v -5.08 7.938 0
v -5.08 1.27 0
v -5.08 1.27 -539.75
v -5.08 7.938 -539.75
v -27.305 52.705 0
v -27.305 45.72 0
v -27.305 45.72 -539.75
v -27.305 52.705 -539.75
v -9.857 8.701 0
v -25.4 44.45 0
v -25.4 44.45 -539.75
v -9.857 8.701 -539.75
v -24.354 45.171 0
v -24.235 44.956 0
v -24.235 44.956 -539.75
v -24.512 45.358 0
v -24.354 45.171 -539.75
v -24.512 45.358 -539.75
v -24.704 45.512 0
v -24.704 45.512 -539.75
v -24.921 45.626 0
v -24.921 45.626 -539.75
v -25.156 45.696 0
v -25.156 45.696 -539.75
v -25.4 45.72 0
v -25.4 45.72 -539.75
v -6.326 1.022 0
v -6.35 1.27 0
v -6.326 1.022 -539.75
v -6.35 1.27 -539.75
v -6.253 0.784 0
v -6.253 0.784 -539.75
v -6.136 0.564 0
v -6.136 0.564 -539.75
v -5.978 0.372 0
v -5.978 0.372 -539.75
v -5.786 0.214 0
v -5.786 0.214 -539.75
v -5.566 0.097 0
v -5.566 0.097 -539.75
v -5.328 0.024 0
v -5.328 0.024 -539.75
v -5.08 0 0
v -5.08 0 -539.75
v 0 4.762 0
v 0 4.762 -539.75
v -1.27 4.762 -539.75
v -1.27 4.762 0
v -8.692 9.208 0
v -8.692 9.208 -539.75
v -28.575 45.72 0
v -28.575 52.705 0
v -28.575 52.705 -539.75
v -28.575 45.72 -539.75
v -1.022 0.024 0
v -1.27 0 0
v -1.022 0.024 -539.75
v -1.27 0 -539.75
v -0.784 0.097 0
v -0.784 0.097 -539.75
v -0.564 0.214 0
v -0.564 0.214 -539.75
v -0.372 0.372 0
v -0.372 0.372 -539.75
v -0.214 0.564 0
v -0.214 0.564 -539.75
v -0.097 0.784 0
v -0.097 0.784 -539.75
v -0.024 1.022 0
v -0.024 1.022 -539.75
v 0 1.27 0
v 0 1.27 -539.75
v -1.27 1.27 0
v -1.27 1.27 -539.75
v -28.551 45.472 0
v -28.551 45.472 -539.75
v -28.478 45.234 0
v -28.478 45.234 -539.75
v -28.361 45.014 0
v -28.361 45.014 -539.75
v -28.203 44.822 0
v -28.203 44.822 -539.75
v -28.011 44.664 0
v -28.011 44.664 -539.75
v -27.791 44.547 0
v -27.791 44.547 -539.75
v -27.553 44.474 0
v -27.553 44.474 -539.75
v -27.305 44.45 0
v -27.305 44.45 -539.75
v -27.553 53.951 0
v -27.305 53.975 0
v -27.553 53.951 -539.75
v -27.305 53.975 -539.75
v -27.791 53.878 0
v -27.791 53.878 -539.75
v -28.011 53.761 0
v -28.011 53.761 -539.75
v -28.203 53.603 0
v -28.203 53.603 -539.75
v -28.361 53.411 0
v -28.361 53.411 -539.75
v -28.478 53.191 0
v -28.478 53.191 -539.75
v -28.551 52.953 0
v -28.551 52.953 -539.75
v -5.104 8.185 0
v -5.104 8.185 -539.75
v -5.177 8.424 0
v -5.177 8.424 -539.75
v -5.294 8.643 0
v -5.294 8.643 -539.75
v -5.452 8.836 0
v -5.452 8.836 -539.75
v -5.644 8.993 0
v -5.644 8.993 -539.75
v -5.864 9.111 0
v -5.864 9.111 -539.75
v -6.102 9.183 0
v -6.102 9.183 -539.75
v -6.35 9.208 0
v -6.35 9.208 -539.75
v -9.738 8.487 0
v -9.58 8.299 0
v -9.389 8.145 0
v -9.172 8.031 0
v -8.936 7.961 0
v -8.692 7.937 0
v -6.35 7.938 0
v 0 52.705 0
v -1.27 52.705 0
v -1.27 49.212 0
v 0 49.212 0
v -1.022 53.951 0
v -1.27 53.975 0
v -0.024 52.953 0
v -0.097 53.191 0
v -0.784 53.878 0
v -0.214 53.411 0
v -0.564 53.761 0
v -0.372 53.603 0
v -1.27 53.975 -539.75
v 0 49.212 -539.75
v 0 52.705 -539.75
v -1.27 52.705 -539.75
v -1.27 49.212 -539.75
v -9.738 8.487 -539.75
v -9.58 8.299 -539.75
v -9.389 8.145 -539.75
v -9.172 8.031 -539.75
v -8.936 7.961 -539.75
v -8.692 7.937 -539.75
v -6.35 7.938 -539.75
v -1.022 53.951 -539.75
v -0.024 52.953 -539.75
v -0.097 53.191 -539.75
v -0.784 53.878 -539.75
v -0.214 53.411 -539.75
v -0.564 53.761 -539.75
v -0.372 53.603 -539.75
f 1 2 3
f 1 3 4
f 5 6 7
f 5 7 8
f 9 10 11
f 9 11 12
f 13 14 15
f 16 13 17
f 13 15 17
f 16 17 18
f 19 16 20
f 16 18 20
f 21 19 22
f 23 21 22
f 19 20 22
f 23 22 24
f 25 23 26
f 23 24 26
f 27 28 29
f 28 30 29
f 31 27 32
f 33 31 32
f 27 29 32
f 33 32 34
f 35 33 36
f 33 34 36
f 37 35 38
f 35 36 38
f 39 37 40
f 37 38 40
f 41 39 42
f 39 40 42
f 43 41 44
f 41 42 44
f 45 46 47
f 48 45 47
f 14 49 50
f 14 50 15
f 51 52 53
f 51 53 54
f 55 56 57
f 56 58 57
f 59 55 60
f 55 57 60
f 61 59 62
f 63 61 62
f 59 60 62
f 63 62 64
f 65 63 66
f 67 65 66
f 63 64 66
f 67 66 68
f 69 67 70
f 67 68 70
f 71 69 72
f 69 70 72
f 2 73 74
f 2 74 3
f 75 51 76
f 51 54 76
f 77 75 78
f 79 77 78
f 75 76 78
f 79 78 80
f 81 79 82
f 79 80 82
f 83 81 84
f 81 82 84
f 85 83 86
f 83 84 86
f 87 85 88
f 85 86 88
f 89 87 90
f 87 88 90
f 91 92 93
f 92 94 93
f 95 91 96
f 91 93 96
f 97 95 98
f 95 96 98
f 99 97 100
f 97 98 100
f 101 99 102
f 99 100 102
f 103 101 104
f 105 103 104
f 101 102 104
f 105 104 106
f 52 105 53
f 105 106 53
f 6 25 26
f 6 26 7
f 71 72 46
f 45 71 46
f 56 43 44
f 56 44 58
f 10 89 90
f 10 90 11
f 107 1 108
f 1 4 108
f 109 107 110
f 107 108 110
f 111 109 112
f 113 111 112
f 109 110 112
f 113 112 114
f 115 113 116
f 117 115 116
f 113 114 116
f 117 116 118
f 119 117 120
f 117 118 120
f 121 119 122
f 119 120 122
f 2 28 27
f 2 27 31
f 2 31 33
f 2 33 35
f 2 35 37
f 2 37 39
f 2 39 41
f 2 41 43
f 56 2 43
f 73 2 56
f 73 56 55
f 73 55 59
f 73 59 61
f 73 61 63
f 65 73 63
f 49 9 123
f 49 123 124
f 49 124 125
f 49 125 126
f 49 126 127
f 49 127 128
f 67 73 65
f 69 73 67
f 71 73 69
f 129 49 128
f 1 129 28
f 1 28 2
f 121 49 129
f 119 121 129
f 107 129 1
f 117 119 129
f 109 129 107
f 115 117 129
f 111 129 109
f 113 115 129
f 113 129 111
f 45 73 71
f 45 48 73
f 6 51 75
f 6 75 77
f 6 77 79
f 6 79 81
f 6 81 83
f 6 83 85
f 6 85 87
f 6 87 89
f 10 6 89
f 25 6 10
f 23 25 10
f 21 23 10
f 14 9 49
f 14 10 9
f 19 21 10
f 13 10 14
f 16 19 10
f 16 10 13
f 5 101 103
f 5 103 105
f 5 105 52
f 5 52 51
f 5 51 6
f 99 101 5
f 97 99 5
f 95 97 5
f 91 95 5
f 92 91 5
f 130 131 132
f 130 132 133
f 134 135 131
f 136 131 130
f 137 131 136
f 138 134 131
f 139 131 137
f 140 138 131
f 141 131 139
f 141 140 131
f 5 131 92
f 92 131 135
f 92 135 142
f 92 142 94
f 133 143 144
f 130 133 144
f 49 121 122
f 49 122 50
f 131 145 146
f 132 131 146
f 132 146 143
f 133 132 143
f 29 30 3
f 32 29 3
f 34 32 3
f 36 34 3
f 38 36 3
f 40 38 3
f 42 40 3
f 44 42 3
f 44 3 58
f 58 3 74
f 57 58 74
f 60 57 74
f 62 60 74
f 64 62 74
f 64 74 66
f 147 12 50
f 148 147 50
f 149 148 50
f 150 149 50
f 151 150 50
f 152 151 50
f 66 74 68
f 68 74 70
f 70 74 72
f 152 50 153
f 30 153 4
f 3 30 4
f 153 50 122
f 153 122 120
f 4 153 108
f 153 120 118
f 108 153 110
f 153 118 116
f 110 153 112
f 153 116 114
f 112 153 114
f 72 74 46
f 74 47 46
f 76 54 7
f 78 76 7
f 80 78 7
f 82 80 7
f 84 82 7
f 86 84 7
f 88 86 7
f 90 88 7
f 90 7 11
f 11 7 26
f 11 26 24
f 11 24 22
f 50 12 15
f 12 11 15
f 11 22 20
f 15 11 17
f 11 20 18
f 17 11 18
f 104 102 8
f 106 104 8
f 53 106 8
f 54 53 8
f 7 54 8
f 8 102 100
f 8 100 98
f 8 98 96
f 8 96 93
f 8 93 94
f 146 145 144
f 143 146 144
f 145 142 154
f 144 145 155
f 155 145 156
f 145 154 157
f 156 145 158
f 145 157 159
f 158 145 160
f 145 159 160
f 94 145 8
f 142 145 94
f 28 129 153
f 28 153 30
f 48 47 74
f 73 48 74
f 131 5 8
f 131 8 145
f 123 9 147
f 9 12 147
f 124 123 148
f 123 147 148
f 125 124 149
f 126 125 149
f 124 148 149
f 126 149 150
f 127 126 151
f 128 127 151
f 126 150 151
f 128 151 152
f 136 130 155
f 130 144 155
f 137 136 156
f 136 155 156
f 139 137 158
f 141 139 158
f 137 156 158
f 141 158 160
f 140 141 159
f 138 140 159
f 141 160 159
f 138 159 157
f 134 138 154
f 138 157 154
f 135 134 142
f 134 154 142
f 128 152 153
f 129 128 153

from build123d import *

# Parameters (mm, degrees)
EXTRUDE_THIN1_DEPTH = 539.75
FILLET1_R           = 1.27


with BuildPart() as part:
    # Sketch1 → Extrude-Thin1 (new body)
    with BuildSketch(Plane.XY):
        Polygon((0, 49.2125), (0, 53.975), (-28.575, 53.975), (-28.575, 44.45), (-25.4, 44.45), (-9.525, 7.9375), (-6.35, 7.9375), (-6.35, 0), (0, 0), (0, 4.7625), (-1.27, 4.7625), (-1.27, 1.27), (-5.08, 1.27), (-5.08, 9.2075), (-8.692328784, 9.2075), (-24.567328784, 45.72), (-27.305, 45.72), (-27.305, 52.705), (-1.27, 52.705), (-1.27, 49.2125), align=None)
    extrude(amount=-EXTRUDE_THIN1_DEPTH)

    # Fillet1
    fillet1_edges = [part.edges().sort_by_distance(p)[0] for p in [
        (0, 0, -269.875),
        (-6.35, 0, -269.875),
        (-9.525, 7.9375, -269.875),
        (-28.575, 44.45, -269.875),
        (-28.575, 53.975, -269.875),
        (0, 53.975, -269.875),
        (-24.567328784, 45.72, -269.875),
        (-5.08, 9.2075, -269.875),
    ]]
    fillet(fillet1_edges, radius=FILLET1_R)


solid = part.part
